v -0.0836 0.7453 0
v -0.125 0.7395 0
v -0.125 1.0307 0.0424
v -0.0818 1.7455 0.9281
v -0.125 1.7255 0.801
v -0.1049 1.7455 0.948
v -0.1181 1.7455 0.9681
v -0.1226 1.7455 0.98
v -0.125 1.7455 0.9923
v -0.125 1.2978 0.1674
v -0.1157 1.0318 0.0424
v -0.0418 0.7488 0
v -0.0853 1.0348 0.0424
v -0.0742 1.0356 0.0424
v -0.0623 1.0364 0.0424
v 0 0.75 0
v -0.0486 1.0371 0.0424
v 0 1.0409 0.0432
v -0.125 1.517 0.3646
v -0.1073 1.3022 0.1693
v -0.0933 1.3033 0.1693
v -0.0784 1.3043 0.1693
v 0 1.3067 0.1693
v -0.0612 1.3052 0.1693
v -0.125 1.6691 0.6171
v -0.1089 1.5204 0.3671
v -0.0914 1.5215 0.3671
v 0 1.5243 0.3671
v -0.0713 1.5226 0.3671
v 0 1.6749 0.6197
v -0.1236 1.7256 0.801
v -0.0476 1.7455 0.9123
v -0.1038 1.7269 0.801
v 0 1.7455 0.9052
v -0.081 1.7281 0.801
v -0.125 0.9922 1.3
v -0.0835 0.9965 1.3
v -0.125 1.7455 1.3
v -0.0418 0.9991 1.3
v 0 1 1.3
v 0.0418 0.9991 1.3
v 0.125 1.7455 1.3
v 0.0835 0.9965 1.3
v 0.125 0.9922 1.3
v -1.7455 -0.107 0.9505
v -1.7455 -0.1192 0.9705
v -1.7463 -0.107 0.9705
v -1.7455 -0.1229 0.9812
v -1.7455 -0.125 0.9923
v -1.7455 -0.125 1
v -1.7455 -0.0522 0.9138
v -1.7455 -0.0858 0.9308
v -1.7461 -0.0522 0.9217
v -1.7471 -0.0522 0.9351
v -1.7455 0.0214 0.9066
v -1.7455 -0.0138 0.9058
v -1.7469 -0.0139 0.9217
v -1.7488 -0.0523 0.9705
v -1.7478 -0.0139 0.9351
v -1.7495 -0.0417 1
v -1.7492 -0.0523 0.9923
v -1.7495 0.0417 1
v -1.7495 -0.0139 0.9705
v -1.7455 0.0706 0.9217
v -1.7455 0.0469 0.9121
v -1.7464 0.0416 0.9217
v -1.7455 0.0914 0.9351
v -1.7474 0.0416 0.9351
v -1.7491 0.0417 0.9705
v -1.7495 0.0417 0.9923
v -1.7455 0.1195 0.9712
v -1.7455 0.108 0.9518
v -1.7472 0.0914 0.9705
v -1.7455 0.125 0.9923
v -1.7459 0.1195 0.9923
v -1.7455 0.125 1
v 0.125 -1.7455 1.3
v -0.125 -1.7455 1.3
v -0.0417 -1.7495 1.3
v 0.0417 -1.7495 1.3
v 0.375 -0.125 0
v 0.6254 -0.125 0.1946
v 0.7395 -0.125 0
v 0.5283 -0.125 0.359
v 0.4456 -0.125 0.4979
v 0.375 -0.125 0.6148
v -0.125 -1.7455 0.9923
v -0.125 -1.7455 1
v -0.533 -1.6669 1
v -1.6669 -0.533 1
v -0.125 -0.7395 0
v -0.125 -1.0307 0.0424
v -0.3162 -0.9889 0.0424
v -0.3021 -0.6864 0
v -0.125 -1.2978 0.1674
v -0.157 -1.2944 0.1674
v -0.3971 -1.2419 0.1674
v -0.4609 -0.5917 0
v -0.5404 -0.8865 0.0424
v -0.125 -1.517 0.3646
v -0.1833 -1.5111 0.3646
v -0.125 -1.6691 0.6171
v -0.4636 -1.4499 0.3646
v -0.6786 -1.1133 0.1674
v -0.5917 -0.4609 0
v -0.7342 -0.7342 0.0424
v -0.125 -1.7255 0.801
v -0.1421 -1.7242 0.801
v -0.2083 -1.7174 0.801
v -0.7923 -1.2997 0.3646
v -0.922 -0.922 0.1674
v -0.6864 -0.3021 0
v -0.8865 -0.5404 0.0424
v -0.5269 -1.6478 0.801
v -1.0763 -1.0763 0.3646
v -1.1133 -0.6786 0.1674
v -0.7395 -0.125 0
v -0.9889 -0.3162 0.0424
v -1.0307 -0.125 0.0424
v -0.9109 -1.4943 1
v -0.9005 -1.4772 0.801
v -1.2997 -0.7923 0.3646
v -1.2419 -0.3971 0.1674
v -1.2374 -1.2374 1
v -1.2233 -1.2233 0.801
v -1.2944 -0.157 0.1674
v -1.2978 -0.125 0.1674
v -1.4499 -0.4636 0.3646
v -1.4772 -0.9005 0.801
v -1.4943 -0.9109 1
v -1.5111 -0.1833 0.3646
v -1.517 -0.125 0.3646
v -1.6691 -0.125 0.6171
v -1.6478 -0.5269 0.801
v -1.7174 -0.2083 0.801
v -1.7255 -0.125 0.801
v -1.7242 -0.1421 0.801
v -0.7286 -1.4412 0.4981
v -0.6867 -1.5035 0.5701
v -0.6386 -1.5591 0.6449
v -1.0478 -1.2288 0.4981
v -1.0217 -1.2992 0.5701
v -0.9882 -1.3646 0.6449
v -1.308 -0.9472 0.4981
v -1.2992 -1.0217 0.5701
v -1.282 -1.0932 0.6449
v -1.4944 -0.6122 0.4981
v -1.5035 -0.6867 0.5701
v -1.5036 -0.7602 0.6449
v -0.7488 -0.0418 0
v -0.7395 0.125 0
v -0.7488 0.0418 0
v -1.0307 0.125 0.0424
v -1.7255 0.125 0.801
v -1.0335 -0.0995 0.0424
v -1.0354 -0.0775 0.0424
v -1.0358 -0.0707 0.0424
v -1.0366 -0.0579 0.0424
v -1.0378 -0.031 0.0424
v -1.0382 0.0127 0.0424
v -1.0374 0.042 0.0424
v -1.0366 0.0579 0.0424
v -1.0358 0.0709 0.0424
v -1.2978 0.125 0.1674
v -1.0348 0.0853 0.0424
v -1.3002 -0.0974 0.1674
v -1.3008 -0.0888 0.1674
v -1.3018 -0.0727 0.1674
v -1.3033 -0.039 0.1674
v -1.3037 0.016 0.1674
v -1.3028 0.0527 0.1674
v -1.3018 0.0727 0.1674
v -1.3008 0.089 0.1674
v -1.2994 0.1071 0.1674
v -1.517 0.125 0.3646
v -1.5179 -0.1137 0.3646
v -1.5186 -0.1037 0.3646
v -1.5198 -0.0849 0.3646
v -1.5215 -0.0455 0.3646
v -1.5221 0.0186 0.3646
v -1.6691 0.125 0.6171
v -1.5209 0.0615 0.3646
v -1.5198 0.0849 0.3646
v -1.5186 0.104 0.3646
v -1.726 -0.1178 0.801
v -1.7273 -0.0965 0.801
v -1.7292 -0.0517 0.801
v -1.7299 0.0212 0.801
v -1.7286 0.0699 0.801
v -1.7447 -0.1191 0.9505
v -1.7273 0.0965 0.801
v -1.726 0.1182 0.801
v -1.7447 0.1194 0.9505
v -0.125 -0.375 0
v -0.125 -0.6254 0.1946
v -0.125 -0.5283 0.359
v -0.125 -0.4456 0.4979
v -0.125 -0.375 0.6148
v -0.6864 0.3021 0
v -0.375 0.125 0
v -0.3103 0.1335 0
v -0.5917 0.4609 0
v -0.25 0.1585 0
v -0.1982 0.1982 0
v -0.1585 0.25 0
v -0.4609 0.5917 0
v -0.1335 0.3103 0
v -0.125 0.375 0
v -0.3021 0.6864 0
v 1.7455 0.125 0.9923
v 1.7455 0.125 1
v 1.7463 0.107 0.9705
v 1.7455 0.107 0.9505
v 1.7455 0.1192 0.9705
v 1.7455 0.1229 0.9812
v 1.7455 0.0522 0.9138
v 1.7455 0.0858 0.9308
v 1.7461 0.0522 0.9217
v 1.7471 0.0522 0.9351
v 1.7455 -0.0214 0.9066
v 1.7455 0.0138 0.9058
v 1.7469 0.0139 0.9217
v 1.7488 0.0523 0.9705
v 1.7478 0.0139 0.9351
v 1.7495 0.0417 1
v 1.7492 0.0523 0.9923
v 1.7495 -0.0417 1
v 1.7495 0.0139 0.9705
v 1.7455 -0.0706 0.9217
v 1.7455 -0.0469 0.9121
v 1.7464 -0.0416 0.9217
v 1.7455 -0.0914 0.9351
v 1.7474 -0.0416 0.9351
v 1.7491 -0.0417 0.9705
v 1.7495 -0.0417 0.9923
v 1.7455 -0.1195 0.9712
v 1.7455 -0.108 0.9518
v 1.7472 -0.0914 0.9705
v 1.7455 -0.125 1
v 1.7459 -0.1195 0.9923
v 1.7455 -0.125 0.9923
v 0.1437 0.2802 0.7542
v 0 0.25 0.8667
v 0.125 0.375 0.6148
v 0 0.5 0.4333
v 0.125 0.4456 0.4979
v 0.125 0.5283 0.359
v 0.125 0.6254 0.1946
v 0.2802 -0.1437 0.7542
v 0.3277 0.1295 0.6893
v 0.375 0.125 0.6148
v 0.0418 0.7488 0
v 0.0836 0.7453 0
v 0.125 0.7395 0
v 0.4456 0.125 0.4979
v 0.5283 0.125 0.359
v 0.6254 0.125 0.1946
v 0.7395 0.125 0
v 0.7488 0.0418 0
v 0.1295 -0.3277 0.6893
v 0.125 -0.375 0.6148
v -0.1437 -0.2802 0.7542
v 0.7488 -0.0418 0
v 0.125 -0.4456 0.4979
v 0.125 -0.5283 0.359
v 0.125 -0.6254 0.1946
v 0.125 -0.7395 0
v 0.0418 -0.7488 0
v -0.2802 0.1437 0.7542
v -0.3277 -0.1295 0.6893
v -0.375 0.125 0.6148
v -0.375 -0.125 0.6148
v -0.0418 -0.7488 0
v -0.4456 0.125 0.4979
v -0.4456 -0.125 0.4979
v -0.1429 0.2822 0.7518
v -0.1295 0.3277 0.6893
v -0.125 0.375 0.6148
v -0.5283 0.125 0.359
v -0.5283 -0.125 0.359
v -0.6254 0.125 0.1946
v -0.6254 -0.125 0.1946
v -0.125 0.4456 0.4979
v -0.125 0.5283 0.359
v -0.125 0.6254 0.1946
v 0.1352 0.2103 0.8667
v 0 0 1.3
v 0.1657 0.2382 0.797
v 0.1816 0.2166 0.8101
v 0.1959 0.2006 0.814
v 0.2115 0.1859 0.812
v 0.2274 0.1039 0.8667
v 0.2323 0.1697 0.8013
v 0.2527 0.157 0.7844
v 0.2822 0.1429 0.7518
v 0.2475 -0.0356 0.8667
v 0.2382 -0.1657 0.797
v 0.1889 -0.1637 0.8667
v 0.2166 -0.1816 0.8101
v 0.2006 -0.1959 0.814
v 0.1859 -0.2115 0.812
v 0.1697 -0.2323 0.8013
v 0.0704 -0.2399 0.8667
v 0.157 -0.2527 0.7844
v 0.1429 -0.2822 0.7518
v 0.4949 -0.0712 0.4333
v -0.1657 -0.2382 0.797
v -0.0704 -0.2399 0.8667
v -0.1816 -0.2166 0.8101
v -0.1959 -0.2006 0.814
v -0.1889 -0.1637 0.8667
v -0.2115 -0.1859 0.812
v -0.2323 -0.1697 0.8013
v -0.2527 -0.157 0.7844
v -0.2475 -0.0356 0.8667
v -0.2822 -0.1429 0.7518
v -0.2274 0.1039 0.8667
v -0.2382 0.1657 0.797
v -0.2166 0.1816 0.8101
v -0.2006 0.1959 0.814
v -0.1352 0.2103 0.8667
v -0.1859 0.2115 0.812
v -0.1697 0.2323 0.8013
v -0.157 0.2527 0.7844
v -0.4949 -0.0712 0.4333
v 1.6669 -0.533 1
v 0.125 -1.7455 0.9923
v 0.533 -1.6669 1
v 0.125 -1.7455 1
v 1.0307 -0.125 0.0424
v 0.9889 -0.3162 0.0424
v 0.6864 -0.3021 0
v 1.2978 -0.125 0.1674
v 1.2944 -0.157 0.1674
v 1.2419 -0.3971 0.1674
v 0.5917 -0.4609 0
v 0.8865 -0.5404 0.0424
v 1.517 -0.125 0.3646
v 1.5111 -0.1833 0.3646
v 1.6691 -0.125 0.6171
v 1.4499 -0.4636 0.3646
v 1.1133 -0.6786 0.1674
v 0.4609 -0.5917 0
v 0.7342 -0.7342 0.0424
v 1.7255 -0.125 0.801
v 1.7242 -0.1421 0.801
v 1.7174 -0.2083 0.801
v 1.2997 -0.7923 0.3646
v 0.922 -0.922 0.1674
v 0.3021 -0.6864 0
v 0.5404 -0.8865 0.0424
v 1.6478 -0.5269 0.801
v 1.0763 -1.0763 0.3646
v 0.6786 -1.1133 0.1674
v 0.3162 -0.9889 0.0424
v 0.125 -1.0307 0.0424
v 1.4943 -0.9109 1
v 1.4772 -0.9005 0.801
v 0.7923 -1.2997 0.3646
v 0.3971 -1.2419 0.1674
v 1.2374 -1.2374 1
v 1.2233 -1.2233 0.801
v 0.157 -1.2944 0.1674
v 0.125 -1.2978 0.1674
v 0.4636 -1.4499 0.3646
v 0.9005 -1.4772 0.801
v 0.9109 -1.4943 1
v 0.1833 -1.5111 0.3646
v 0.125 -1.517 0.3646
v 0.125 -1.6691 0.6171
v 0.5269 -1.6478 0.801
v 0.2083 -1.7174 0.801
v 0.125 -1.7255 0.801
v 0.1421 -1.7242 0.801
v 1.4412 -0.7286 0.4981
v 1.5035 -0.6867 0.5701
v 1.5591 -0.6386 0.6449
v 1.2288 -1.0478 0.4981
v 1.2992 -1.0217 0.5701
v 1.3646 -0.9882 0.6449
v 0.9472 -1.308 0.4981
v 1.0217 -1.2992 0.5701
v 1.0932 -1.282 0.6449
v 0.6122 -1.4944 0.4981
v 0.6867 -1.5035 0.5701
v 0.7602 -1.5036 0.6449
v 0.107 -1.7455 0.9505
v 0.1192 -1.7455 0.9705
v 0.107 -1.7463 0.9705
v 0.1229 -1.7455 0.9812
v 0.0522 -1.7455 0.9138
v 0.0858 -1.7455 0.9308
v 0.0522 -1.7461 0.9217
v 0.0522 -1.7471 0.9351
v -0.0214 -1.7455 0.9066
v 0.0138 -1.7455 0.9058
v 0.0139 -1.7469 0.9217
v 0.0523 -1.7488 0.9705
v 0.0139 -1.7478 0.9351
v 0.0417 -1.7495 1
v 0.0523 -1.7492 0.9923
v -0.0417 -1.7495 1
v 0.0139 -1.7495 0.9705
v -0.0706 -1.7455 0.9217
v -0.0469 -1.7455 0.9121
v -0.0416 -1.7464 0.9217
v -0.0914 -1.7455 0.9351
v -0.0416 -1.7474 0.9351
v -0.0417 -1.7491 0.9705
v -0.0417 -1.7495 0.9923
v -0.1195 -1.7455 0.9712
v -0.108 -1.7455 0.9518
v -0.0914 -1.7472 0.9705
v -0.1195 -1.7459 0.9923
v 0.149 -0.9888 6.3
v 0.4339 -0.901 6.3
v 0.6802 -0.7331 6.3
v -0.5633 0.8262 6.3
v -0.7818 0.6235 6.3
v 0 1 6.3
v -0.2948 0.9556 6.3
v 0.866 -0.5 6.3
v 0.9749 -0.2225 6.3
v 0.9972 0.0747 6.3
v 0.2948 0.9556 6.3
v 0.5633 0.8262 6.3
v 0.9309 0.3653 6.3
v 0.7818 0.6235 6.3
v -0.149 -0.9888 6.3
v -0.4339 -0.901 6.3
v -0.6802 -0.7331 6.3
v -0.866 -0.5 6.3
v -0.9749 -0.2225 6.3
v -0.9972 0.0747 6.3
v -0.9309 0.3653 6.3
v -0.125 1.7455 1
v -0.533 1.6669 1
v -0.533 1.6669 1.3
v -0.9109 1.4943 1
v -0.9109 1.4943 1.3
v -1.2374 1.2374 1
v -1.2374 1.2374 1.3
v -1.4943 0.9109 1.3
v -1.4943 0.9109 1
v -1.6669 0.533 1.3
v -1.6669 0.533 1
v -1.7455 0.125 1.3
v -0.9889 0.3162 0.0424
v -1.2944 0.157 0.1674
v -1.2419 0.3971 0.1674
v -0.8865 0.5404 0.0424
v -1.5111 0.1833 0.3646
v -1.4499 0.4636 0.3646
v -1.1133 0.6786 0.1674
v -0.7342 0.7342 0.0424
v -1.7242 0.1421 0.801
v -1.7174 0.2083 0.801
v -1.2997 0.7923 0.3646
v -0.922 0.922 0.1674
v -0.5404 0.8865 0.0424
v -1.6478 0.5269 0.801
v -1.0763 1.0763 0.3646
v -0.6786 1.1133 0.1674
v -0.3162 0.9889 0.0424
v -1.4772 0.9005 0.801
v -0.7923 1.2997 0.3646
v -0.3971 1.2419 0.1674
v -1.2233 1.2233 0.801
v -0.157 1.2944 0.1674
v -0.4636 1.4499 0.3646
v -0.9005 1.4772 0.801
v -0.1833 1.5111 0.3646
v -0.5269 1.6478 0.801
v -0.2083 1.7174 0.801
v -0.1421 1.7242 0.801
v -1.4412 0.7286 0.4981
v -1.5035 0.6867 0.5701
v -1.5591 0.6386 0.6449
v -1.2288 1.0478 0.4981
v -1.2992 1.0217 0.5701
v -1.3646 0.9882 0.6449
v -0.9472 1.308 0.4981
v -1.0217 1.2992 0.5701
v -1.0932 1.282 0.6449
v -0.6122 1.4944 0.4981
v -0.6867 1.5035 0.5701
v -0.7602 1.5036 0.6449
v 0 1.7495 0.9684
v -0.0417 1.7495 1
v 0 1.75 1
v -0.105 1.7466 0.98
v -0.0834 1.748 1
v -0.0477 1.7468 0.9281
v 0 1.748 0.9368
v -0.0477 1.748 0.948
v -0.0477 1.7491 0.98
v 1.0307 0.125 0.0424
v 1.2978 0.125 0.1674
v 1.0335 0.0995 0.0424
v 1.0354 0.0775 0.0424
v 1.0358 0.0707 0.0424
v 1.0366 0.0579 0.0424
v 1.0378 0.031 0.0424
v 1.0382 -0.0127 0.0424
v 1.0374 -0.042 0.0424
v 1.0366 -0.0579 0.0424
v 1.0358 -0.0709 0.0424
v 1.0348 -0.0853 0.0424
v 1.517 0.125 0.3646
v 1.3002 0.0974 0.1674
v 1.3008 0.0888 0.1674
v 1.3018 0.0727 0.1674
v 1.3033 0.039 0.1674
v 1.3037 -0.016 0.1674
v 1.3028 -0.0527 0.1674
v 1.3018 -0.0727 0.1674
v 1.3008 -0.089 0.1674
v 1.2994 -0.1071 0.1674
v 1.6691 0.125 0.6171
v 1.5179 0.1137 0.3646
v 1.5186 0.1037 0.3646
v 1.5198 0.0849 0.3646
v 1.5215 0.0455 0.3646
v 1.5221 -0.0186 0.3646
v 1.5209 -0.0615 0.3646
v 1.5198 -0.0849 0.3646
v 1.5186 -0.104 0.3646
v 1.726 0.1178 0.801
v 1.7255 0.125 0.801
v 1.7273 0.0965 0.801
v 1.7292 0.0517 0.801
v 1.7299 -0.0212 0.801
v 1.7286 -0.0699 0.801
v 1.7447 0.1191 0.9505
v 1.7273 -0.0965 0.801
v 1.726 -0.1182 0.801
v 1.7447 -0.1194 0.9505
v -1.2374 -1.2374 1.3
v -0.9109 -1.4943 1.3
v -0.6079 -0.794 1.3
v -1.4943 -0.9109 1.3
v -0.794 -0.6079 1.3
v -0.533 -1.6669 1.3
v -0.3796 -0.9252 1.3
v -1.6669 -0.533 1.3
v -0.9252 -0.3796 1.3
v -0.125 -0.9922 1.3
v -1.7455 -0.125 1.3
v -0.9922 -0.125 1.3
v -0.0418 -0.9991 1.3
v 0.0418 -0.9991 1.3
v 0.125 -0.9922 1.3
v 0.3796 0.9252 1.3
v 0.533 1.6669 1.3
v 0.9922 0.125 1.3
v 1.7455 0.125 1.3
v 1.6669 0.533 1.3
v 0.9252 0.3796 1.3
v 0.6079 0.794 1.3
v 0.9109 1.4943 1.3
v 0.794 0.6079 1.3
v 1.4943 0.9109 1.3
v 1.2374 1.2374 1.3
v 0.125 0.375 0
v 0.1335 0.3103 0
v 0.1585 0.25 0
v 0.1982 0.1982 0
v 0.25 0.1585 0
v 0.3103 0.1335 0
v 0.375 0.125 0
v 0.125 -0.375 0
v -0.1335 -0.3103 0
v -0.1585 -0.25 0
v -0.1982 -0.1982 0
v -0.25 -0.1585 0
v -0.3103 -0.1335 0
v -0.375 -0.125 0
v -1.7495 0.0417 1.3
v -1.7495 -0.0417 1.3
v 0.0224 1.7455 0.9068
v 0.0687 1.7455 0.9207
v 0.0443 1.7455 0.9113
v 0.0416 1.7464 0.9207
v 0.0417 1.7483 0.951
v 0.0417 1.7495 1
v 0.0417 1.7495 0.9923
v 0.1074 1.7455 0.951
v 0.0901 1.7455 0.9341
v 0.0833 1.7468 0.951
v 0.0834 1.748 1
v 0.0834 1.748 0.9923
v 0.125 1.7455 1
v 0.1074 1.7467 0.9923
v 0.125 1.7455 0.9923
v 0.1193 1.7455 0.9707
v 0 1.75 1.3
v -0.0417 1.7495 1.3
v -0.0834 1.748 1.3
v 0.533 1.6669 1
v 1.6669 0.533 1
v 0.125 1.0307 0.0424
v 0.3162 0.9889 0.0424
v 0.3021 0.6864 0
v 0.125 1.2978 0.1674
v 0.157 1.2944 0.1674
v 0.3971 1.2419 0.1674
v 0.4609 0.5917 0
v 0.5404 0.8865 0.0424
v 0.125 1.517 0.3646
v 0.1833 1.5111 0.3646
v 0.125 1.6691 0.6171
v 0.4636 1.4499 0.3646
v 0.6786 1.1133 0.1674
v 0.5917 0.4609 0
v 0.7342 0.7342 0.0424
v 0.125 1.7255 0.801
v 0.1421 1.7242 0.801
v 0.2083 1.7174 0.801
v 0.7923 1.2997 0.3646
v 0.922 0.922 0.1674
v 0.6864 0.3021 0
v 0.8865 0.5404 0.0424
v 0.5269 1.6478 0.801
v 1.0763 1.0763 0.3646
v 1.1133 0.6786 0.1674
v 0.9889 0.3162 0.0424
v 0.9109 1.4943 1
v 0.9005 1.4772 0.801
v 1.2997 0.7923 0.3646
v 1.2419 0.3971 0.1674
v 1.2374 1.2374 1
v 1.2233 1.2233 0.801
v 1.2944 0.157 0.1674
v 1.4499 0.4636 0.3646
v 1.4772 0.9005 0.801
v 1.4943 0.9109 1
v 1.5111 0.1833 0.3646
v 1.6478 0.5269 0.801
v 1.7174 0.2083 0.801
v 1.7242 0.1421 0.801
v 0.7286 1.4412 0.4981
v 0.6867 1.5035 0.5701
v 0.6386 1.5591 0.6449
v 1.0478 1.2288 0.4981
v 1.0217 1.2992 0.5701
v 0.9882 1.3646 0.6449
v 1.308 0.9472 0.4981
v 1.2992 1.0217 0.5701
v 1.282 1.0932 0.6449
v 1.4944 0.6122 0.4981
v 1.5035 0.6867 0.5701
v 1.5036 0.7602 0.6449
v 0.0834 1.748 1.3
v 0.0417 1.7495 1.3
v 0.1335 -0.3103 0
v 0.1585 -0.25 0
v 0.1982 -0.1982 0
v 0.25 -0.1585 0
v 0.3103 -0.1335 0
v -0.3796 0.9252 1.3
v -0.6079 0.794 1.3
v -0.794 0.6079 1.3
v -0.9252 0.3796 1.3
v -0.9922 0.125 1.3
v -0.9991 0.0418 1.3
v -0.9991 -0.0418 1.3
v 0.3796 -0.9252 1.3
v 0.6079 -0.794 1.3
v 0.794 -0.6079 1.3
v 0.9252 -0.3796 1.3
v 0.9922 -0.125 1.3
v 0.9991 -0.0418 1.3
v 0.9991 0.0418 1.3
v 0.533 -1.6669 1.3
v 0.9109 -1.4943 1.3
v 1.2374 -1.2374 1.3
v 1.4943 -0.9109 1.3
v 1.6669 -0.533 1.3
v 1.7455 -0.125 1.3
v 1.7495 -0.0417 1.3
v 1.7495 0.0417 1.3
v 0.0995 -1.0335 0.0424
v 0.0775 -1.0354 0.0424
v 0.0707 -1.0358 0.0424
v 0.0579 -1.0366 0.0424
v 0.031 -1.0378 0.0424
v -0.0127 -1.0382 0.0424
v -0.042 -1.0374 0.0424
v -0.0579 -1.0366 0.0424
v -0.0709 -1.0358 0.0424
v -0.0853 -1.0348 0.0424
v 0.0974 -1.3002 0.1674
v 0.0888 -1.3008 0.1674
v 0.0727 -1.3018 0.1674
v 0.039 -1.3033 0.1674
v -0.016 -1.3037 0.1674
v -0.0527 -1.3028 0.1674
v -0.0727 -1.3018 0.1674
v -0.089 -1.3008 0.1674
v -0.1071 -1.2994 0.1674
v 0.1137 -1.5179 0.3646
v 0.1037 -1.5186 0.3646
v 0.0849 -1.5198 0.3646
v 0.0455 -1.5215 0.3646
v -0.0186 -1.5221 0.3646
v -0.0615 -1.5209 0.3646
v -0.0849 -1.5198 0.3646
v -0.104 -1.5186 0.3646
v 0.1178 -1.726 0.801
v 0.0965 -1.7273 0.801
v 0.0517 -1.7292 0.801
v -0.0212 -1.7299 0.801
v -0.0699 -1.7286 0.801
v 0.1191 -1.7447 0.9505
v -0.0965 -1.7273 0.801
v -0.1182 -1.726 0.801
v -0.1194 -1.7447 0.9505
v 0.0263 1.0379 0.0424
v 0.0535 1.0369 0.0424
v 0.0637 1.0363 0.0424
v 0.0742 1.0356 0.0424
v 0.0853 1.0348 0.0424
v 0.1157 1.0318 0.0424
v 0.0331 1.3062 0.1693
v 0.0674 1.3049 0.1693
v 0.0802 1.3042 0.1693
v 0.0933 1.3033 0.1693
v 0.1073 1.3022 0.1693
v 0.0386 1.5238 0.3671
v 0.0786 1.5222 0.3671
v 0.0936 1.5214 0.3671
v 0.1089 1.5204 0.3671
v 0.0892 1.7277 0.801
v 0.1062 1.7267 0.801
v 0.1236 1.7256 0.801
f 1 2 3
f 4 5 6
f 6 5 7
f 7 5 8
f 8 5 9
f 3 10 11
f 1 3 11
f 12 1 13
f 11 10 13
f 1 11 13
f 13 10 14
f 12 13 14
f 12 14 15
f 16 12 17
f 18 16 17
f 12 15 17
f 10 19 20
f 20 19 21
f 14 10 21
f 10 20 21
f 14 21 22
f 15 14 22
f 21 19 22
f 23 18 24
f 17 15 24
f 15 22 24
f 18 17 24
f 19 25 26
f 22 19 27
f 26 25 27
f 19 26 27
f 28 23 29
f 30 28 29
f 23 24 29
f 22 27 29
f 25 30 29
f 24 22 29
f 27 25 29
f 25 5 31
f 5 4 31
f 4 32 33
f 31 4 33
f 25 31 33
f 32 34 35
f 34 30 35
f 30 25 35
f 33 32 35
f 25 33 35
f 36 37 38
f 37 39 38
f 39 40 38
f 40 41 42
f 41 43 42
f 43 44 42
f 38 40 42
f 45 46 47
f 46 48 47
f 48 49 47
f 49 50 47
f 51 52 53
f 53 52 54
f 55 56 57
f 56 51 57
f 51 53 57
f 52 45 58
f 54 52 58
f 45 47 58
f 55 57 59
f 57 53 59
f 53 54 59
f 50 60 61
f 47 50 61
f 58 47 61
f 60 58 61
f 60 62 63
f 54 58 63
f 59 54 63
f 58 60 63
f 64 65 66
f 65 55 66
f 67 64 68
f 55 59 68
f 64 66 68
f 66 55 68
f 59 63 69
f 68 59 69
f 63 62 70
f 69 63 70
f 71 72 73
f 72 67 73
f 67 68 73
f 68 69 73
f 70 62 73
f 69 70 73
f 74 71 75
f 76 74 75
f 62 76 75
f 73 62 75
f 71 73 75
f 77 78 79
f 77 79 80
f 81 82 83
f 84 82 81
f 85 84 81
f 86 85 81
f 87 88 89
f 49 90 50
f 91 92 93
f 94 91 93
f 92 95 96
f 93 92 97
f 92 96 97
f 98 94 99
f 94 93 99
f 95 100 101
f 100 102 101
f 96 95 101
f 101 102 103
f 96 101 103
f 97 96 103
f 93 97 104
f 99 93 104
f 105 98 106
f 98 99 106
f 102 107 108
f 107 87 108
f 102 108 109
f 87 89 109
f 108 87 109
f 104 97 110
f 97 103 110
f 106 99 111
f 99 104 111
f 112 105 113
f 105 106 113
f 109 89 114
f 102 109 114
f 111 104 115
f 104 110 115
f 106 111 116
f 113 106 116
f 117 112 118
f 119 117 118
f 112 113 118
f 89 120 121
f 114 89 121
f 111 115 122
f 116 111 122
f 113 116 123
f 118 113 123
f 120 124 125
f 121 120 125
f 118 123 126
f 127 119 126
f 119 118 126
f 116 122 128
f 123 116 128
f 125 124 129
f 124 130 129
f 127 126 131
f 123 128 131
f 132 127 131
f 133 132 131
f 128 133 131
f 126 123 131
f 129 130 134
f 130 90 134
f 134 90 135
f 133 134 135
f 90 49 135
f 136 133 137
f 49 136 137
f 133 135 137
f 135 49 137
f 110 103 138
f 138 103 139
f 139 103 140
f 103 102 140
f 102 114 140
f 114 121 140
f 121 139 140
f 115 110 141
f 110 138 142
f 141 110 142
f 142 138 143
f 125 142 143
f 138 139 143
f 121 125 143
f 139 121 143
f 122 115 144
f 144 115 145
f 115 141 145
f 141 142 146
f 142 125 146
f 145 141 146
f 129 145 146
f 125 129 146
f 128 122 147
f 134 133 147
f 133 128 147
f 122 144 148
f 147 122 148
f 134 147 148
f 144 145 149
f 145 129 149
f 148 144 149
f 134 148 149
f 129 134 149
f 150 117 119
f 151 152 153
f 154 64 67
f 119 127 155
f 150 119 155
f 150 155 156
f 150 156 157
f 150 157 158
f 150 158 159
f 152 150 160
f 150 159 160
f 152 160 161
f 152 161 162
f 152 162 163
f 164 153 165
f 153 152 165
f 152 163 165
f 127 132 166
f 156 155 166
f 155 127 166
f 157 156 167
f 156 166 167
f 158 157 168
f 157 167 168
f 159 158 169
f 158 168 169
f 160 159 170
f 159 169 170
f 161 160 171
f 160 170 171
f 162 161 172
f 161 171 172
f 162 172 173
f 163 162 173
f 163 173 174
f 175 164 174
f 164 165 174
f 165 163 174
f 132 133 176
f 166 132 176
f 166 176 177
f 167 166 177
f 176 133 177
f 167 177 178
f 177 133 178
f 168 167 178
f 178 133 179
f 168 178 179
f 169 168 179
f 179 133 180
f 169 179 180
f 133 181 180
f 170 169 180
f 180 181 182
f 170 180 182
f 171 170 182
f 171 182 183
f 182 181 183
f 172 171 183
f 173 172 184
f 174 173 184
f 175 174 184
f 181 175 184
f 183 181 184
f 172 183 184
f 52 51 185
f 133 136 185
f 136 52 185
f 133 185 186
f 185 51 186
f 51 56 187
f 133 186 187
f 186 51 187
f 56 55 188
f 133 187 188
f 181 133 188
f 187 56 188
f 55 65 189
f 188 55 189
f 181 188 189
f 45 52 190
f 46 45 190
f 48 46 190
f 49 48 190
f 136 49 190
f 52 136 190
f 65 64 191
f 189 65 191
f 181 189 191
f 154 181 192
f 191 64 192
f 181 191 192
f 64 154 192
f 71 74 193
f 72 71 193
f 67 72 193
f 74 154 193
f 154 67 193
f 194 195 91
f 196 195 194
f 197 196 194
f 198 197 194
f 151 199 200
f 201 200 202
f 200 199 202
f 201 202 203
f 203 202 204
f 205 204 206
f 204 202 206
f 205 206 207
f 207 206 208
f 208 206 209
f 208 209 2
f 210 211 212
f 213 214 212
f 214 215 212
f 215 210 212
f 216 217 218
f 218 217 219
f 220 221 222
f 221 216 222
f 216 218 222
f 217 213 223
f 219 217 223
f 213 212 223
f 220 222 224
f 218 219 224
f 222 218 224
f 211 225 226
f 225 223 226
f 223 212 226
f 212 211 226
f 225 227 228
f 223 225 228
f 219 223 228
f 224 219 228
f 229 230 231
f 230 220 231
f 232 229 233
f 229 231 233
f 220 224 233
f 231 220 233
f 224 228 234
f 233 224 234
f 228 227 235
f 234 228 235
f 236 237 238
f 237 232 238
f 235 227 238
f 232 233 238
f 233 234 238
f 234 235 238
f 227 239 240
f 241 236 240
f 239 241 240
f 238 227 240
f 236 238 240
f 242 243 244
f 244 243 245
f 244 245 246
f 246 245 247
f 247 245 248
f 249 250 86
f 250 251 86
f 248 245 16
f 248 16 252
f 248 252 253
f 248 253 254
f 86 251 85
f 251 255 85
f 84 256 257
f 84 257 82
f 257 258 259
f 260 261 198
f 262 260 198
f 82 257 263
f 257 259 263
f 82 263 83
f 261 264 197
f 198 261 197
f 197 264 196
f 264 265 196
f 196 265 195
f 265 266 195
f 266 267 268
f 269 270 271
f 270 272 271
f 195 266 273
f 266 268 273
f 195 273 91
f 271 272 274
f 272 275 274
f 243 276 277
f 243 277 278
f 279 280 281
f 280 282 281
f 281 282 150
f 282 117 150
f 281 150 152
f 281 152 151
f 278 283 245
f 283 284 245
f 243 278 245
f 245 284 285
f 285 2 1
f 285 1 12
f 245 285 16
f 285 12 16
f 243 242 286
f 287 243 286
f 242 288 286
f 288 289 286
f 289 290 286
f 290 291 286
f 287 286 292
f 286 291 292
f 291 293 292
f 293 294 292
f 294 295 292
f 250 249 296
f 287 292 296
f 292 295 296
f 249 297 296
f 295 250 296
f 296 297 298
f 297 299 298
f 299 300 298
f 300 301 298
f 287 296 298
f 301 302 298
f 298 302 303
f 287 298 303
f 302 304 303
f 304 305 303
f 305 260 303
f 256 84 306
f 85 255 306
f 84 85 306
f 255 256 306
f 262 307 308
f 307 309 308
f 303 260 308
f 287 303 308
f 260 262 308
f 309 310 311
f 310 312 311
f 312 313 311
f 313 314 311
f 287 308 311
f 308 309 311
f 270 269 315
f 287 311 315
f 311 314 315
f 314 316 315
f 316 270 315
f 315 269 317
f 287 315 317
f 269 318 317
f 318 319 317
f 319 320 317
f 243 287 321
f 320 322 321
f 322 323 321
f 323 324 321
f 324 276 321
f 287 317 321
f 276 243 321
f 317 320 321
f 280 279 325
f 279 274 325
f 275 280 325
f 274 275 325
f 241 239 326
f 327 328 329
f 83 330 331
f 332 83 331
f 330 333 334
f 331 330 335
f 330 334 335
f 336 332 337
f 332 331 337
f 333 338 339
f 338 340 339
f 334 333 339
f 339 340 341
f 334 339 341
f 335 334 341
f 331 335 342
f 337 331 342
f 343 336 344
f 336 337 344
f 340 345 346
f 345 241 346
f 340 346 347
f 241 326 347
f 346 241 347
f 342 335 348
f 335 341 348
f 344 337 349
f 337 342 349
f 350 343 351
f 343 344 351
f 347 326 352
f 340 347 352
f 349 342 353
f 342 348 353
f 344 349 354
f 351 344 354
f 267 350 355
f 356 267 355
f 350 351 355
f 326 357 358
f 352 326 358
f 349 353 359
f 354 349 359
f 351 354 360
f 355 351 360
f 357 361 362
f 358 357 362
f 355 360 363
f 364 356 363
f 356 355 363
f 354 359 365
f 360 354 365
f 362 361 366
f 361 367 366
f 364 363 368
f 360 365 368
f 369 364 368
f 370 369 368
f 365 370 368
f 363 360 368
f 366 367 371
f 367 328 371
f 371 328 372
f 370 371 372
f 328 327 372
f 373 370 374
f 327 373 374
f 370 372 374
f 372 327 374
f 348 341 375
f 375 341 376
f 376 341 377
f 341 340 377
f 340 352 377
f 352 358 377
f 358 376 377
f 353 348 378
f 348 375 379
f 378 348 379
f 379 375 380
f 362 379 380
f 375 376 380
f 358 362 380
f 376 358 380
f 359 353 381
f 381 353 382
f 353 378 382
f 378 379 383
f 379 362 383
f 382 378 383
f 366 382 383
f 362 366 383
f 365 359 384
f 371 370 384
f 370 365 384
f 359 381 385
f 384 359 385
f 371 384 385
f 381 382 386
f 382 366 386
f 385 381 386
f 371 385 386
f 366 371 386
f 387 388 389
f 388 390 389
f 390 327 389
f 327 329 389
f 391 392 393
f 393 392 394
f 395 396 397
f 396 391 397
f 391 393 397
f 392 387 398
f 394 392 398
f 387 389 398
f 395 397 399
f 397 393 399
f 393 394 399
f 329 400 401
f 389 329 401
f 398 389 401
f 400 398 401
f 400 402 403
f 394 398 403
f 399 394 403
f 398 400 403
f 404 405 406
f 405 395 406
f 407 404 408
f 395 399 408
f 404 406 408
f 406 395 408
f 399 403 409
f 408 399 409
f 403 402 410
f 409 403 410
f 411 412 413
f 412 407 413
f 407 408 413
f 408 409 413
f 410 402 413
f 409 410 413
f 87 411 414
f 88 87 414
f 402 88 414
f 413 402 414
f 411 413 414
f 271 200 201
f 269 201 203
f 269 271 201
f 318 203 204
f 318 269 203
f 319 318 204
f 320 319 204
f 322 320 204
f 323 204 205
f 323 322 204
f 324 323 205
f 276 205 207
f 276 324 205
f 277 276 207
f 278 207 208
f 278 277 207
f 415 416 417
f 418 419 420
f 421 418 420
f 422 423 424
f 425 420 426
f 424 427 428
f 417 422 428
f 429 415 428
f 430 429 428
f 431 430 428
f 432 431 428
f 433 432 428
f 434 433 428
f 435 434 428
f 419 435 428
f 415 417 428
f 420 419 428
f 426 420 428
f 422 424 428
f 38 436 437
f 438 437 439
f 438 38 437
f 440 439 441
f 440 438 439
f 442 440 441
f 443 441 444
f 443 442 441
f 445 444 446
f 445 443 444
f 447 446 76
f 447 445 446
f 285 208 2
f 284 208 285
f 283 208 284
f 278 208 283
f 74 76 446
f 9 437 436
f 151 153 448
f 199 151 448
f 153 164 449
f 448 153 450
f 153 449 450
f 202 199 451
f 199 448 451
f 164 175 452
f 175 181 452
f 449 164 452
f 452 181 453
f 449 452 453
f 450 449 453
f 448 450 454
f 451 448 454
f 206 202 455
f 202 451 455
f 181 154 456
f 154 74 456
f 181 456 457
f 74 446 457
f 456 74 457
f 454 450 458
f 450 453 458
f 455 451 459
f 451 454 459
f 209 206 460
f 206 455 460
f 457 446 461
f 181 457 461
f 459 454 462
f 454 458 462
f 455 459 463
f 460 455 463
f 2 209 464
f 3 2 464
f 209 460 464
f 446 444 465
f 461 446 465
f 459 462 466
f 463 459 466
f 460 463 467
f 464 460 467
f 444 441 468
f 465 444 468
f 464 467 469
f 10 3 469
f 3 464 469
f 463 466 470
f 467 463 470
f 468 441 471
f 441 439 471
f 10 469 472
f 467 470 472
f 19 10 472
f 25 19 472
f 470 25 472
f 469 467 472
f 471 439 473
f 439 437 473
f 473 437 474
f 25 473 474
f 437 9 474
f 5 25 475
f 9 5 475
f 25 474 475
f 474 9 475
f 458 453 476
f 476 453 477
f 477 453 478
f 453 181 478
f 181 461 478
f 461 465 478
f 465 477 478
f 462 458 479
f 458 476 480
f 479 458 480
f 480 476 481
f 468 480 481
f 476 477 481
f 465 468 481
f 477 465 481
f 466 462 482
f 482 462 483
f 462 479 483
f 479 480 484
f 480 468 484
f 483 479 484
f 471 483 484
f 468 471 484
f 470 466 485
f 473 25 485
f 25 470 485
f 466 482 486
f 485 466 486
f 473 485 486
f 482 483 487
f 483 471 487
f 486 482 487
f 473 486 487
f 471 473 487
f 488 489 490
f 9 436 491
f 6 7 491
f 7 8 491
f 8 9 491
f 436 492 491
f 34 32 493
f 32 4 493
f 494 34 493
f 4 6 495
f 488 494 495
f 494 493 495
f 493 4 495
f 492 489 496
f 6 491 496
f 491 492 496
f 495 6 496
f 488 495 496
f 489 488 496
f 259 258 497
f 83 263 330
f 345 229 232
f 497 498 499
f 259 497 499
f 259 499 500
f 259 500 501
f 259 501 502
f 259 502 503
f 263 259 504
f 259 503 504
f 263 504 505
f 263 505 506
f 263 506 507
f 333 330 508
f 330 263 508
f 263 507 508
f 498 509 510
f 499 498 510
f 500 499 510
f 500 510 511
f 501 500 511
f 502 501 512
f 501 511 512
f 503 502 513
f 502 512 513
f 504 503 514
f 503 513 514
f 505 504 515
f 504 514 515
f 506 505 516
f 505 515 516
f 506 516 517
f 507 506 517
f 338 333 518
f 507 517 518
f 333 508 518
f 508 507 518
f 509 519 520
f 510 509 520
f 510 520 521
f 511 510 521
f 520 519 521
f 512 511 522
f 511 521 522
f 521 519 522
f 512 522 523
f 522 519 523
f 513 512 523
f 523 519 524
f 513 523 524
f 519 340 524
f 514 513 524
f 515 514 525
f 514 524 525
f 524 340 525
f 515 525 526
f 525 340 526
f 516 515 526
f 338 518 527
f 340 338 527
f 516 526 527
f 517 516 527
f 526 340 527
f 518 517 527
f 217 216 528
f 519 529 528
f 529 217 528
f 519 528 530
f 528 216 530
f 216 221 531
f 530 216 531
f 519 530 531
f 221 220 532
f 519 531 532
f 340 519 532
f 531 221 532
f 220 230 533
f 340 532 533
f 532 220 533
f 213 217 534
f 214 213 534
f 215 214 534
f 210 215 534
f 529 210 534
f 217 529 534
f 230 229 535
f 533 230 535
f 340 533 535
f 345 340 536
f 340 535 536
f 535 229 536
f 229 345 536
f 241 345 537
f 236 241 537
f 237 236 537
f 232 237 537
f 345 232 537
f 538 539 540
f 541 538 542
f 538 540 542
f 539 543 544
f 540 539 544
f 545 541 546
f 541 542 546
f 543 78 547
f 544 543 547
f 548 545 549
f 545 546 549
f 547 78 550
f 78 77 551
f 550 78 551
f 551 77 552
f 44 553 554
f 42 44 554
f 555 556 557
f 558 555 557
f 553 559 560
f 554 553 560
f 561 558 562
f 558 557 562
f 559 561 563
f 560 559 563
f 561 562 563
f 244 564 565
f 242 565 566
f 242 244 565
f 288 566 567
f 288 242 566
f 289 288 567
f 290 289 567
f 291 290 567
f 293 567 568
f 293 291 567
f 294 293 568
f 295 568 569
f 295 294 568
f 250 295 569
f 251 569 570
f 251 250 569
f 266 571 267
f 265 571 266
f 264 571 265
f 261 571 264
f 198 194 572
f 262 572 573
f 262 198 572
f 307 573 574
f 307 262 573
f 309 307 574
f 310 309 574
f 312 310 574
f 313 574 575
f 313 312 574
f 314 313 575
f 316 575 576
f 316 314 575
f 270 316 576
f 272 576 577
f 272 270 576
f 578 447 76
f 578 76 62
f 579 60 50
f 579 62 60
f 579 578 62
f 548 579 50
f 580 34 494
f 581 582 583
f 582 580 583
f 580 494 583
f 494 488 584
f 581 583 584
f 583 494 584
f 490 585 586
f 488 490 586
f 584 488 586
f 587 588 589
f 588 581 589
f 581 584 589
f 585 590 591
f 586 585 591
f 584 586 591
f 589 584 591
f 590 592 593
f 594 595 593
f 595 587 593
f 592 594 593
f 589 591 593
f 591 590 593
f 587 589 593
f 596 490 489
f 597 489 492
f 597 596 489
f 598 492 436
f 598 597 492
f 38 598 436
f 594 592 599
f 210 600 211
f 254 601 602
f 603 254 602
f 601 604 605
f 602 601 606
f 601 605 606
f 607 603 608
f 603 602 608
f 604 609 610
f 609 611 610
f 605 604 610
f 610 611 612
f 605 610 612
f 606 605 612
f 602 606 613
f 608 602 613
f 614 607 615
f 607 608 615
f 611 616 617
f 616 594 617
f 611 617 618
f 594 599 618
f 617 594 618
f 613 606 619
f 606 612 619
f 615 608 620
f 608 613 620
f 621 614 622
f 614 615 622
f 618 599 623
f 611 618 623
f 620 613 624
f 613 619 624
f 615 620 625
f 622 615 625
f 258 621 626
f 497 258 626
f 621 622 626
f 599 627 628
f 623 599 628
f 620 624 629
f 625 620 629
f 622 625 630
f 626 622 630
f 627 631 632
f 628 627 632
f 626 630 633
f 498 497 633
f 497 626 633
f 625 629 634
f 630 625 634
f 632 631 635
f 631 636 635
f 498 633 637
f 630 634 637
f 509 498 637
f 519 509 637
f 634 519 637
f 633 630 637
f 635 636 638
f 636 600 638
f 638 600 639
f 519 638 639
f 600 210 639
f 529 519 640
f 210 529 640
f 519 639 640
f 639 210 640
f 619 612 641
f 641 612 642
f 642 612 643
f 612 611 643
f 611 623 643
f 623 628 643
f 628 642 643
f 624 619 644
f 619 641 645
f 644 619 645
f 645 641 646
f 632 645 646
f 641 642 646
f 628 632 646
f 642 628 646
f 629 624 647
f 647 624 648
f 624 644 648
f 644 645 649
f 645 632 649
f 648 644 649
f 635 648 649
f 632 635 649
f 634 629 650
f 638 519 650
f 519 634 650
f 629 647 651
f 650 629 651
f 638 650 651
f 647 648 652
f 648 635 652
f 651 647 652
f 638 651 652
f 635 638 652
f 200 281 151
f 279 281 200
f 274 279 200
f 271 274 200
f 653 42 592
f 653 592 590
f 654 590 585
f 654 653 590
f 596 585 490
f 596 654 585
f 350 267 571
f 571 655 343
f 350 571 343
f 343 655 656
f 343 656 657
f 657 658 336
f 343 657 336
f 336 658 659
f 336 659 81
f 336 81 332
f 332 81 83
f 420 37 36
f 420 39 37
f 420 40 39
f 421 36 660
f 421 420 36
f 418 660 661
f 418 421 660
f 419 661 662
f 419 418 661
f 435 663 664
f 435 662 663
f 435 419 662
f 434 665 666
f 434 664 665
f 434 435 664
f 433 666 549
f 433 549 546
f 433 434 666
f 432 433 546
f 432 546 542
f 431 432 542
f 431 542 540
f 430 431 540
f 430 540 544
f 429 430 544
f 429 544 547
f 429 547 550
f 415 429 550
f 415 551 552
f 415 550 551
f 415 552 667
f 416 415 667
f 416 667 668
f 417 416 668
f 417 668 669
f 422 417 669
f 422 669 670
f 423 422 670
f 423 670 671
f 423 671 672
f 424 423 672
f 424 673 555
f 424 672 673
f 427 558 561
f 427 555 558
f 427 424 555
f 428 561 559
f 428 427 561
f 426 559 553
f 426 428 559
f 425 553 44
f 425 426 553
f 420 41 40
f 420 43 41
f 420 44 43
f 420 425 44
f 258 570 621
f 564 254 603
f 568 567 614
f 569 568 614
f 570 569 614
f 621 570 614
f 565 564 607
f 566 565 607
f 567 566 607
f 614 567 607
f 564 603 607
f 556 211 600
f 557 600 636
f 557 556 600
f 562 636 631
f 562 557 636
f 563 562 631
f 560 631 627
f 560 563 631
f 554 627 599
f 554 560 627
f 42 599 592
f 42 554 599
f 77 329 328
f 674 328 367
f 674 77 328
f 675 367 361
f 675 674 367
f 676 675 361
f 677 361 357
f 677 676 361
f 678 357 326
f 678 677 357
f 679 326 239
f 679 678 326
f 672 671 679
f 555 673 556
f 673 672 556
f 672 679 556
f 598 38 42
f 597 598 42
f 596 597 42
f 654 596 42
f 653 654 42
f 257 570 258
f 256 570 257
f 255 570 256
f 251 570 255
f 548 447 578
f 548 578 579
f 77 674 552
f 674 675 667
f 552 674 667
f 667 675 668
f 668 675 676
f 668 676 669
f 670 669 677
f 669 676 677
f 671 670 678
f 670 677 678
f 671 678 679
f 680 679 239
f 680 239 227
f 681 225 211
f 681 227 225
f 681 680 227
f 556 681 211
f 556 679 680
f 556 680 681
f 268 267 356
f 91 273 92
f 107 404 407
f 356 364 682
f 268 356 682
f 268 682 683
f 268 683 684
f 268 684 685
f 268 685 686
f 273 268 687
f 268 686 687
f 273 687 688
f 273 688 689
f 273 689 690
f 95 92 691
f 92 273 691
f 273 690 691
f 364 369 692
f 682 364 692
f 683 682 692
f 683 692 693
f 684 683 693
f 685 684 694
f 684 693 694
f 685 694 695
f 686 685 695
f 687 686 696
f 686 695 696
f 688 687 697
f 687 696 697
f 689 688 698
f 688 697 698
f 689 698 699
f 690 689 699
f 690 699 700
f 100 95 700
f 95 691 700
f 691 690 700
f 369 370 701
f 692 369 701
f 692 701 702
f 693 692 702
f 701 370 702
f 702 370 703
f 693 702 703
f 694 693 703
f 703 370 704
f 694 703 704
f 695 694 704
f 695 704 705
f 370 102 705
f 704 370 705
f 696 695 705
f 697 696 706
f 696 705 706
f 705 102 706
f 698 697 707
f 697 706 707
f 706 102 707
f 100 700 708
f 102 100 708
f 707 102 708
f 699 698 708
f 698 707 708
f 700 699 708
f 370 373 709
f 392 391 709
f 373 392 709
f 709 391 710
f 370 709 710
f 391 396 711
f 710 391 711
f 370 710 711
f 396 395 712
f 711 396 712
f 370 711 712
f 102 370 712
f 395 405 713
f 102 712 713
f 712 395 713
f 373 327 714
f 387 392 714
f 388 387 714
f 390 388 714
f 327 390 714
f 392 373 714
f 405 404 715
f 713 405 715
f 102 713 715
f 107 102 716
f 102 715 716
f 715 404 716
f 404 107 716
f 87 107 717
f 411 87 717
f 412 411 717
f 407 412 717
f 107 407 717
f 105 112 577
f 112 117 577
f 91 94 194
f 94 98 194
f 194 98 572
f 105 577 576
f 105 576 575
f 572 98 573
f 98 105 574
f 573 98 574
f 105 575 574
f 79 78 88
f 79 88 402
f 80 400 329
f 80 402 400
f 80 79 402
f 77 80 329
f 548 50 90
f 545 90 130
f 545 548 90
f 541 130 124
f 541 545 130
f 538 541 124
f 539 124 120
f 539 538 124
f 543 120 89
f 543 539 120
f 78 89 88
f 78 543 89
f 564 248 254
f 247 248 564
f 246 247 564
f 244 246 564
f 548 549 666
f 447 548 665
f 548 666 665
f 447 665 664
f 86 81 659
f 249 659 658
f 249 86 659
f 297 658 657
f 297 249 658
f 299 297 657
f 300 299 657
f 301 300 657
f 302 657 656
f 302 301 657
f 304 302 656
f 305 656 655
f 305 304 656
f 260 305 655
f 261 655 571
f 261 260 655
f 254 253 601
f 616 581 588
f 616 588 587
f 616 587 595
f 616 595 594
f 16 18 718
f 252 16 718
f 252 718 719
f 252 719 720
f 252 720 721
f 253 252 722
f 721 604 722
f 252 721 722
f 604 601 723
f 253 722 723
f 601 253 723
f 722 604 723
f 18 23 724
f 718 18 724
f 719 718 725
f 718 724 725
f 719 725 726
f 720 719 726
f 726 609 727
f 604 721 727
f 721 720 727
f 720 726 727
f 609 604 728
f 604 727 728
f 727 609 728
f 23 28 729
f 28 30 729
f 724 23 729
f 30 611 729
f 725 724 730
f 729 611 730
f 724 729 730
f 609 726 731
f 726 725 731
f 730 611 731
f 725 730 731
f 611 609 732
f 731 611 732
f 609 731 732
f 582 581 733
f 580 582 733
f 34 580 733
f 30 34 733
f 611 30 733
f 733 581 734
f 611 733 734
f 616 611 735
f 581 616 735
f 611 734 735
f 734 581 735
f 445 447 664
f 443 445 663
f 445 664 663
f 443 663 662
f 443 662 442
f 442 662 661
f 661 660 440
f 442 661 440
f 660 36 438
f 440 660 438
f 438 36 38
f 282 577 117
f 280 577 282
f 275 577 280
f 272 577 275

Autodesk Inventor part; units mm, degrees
ref_plane "YZ Plane" through (0, 0, 0) normal (1, 0, 0) x (0, 1, 0)
ref_plane "XZ Plane" through (0, 0, 0) normal (0, 1, 0) x (-1, 0, 0)
ref_plane "XY Plane" through (0, 0, 0) normal (0, 0, 1) x (1, 0, 0)
sketch "スケッチ1" plane through (0, 0, 0) normal (1, 0, 0) x (0, 1, 0)
  line L0 (0, 6.3) -> (0, 0)
  line L1 (0, 0) -> (0.75, 0)
  line L2 (1.75, 1) -> (1.75, 1.3)
  line L3 (1.75, 1.3) -> (1, 1.3)
  line L4 (1, 1.3) -> (1, 6.3)
  line L5 (1, 6.3) -> (0, 6.3)
  line L6 (0.75, 0) -> (0, 1.3)
  arc A0 (0.75, 0) -> (1.75, 1) centre (0.75, 1) ccw
  line L7 (0.75, 0) -> (1.75, 0)
  line L8 (1.75, 0) -> (1.75, 1)
  dimension "d2" = 1.3
  dimension "d10" = 5
  dimension "d11" = 2
  dimension "d12" = 3.5
  dimension "d14" = 1
revolve "回転1" add sketch "スケッチ1" angle 360 about axis through (0, 0, 6.3) along (0, 0, -1) contours L5 L4 L3 L2 A0 L6 L0
thread "ねじ1" size "M2x0.4" class "6g" standard "ANSI Metric M Profile" full length
sketch "スケッチ2" plane through (0, 0, 1.3) normal (0, 0, 1) x (1, 0, 0)
  line L0 (0.125, -1.7455) -> (-0.125, -1.7455)
  line L1 (-0.125, -1.7455) -> (-0.125, -0.375)
  line L2 (-0.125, 1.7455) -> (0.125, 1.7455)
  line L3 (0.125, 1.7455) -> (0.125, 0.375)
  line L4 (0.125, -1.7455) -> (-0.125, 1.7455) construction
  line L5 (-0.125, -1.7455) -> (0.125, 1.7455) construction
  line L6 (-1.7455, 0.125) -> (-0.375, 0.125)
  line L7 (1.7455, 0.125) -> (1.7455, -0.125)
  line L8 (1.7455, -0.125) -> (0.375, -0.125)
  line L9 (-1.7455, -0.125) -> (-1.7455, 0.125)
  line L10 (-1.7455, 0.125) -> (1.7455, -0.125) construction
  line L11 (1.7455, 0.125) -> (-1.7455, -0.125) construction
  line L12 (0.125, -0.375) -> (0.125, -1.7455)
  line L13 (0.375, 0.125) -> (1.7455, 0.125)
  line L14 (-0.375, -0.125) -> (-1.7455, -0.125)
  line L15 (-0.125, 0.375) -> (-0.125, 1.7455)
  arc A0 (0.375, -0.125) -> (0.125, -0.375) centre (0.375, -0.375) ccw
  arc A1 (0.125, 0.375) -> (0.375, 0.125) centre (0.375, 0.375) ccw
  arc A2 (-0.375, 0.125) -> (-0.125, 0.375) centre (-0.375, 0.375) ccw
  arc A3 (-0.125, -0.375) -> (-0.375, -0.125) centre (-0.375, -0.375) ccw
  circle A4 centre (0, 0) radius 1.75 projected
  line L16 (0, 1.75) -> (0, -1.75) construction
  line L17 (1.7455, 0) -> (-1.7455, 0) construction
  point P0 (-0.3339, -0.2226)
  point P1 (-0.3339, 0.2226)
  point P2 (0.3339, 0.2226)
  point P3 (0.3339, -0.2226)
  point P4 (0, 0)
  dimension "d18" = 0.25
  dimension "d19" = 0.25
  dimension "d20" = 0.25
extrude "押し出し2" add sketch "スケッチ2" against normal blind 1.3 contours A4 L0 | L12 A0 L8 A4 | A4 L14 A3 L1 | L7 A4 | A4 L9 | L13 A1 L3 A4 | A4 L15 A2 L6 | L2 A4
revolve "回転2" cut sketch "スケッチ1" angle 360 about axis through (0, 0, 6.3) along (0, 0, -1) contours A0 L8 L7
equation "\"d19\" = d20"
equation "\"d20\" = d18"
properties part number "U-0205" material "Stainless Steel"
